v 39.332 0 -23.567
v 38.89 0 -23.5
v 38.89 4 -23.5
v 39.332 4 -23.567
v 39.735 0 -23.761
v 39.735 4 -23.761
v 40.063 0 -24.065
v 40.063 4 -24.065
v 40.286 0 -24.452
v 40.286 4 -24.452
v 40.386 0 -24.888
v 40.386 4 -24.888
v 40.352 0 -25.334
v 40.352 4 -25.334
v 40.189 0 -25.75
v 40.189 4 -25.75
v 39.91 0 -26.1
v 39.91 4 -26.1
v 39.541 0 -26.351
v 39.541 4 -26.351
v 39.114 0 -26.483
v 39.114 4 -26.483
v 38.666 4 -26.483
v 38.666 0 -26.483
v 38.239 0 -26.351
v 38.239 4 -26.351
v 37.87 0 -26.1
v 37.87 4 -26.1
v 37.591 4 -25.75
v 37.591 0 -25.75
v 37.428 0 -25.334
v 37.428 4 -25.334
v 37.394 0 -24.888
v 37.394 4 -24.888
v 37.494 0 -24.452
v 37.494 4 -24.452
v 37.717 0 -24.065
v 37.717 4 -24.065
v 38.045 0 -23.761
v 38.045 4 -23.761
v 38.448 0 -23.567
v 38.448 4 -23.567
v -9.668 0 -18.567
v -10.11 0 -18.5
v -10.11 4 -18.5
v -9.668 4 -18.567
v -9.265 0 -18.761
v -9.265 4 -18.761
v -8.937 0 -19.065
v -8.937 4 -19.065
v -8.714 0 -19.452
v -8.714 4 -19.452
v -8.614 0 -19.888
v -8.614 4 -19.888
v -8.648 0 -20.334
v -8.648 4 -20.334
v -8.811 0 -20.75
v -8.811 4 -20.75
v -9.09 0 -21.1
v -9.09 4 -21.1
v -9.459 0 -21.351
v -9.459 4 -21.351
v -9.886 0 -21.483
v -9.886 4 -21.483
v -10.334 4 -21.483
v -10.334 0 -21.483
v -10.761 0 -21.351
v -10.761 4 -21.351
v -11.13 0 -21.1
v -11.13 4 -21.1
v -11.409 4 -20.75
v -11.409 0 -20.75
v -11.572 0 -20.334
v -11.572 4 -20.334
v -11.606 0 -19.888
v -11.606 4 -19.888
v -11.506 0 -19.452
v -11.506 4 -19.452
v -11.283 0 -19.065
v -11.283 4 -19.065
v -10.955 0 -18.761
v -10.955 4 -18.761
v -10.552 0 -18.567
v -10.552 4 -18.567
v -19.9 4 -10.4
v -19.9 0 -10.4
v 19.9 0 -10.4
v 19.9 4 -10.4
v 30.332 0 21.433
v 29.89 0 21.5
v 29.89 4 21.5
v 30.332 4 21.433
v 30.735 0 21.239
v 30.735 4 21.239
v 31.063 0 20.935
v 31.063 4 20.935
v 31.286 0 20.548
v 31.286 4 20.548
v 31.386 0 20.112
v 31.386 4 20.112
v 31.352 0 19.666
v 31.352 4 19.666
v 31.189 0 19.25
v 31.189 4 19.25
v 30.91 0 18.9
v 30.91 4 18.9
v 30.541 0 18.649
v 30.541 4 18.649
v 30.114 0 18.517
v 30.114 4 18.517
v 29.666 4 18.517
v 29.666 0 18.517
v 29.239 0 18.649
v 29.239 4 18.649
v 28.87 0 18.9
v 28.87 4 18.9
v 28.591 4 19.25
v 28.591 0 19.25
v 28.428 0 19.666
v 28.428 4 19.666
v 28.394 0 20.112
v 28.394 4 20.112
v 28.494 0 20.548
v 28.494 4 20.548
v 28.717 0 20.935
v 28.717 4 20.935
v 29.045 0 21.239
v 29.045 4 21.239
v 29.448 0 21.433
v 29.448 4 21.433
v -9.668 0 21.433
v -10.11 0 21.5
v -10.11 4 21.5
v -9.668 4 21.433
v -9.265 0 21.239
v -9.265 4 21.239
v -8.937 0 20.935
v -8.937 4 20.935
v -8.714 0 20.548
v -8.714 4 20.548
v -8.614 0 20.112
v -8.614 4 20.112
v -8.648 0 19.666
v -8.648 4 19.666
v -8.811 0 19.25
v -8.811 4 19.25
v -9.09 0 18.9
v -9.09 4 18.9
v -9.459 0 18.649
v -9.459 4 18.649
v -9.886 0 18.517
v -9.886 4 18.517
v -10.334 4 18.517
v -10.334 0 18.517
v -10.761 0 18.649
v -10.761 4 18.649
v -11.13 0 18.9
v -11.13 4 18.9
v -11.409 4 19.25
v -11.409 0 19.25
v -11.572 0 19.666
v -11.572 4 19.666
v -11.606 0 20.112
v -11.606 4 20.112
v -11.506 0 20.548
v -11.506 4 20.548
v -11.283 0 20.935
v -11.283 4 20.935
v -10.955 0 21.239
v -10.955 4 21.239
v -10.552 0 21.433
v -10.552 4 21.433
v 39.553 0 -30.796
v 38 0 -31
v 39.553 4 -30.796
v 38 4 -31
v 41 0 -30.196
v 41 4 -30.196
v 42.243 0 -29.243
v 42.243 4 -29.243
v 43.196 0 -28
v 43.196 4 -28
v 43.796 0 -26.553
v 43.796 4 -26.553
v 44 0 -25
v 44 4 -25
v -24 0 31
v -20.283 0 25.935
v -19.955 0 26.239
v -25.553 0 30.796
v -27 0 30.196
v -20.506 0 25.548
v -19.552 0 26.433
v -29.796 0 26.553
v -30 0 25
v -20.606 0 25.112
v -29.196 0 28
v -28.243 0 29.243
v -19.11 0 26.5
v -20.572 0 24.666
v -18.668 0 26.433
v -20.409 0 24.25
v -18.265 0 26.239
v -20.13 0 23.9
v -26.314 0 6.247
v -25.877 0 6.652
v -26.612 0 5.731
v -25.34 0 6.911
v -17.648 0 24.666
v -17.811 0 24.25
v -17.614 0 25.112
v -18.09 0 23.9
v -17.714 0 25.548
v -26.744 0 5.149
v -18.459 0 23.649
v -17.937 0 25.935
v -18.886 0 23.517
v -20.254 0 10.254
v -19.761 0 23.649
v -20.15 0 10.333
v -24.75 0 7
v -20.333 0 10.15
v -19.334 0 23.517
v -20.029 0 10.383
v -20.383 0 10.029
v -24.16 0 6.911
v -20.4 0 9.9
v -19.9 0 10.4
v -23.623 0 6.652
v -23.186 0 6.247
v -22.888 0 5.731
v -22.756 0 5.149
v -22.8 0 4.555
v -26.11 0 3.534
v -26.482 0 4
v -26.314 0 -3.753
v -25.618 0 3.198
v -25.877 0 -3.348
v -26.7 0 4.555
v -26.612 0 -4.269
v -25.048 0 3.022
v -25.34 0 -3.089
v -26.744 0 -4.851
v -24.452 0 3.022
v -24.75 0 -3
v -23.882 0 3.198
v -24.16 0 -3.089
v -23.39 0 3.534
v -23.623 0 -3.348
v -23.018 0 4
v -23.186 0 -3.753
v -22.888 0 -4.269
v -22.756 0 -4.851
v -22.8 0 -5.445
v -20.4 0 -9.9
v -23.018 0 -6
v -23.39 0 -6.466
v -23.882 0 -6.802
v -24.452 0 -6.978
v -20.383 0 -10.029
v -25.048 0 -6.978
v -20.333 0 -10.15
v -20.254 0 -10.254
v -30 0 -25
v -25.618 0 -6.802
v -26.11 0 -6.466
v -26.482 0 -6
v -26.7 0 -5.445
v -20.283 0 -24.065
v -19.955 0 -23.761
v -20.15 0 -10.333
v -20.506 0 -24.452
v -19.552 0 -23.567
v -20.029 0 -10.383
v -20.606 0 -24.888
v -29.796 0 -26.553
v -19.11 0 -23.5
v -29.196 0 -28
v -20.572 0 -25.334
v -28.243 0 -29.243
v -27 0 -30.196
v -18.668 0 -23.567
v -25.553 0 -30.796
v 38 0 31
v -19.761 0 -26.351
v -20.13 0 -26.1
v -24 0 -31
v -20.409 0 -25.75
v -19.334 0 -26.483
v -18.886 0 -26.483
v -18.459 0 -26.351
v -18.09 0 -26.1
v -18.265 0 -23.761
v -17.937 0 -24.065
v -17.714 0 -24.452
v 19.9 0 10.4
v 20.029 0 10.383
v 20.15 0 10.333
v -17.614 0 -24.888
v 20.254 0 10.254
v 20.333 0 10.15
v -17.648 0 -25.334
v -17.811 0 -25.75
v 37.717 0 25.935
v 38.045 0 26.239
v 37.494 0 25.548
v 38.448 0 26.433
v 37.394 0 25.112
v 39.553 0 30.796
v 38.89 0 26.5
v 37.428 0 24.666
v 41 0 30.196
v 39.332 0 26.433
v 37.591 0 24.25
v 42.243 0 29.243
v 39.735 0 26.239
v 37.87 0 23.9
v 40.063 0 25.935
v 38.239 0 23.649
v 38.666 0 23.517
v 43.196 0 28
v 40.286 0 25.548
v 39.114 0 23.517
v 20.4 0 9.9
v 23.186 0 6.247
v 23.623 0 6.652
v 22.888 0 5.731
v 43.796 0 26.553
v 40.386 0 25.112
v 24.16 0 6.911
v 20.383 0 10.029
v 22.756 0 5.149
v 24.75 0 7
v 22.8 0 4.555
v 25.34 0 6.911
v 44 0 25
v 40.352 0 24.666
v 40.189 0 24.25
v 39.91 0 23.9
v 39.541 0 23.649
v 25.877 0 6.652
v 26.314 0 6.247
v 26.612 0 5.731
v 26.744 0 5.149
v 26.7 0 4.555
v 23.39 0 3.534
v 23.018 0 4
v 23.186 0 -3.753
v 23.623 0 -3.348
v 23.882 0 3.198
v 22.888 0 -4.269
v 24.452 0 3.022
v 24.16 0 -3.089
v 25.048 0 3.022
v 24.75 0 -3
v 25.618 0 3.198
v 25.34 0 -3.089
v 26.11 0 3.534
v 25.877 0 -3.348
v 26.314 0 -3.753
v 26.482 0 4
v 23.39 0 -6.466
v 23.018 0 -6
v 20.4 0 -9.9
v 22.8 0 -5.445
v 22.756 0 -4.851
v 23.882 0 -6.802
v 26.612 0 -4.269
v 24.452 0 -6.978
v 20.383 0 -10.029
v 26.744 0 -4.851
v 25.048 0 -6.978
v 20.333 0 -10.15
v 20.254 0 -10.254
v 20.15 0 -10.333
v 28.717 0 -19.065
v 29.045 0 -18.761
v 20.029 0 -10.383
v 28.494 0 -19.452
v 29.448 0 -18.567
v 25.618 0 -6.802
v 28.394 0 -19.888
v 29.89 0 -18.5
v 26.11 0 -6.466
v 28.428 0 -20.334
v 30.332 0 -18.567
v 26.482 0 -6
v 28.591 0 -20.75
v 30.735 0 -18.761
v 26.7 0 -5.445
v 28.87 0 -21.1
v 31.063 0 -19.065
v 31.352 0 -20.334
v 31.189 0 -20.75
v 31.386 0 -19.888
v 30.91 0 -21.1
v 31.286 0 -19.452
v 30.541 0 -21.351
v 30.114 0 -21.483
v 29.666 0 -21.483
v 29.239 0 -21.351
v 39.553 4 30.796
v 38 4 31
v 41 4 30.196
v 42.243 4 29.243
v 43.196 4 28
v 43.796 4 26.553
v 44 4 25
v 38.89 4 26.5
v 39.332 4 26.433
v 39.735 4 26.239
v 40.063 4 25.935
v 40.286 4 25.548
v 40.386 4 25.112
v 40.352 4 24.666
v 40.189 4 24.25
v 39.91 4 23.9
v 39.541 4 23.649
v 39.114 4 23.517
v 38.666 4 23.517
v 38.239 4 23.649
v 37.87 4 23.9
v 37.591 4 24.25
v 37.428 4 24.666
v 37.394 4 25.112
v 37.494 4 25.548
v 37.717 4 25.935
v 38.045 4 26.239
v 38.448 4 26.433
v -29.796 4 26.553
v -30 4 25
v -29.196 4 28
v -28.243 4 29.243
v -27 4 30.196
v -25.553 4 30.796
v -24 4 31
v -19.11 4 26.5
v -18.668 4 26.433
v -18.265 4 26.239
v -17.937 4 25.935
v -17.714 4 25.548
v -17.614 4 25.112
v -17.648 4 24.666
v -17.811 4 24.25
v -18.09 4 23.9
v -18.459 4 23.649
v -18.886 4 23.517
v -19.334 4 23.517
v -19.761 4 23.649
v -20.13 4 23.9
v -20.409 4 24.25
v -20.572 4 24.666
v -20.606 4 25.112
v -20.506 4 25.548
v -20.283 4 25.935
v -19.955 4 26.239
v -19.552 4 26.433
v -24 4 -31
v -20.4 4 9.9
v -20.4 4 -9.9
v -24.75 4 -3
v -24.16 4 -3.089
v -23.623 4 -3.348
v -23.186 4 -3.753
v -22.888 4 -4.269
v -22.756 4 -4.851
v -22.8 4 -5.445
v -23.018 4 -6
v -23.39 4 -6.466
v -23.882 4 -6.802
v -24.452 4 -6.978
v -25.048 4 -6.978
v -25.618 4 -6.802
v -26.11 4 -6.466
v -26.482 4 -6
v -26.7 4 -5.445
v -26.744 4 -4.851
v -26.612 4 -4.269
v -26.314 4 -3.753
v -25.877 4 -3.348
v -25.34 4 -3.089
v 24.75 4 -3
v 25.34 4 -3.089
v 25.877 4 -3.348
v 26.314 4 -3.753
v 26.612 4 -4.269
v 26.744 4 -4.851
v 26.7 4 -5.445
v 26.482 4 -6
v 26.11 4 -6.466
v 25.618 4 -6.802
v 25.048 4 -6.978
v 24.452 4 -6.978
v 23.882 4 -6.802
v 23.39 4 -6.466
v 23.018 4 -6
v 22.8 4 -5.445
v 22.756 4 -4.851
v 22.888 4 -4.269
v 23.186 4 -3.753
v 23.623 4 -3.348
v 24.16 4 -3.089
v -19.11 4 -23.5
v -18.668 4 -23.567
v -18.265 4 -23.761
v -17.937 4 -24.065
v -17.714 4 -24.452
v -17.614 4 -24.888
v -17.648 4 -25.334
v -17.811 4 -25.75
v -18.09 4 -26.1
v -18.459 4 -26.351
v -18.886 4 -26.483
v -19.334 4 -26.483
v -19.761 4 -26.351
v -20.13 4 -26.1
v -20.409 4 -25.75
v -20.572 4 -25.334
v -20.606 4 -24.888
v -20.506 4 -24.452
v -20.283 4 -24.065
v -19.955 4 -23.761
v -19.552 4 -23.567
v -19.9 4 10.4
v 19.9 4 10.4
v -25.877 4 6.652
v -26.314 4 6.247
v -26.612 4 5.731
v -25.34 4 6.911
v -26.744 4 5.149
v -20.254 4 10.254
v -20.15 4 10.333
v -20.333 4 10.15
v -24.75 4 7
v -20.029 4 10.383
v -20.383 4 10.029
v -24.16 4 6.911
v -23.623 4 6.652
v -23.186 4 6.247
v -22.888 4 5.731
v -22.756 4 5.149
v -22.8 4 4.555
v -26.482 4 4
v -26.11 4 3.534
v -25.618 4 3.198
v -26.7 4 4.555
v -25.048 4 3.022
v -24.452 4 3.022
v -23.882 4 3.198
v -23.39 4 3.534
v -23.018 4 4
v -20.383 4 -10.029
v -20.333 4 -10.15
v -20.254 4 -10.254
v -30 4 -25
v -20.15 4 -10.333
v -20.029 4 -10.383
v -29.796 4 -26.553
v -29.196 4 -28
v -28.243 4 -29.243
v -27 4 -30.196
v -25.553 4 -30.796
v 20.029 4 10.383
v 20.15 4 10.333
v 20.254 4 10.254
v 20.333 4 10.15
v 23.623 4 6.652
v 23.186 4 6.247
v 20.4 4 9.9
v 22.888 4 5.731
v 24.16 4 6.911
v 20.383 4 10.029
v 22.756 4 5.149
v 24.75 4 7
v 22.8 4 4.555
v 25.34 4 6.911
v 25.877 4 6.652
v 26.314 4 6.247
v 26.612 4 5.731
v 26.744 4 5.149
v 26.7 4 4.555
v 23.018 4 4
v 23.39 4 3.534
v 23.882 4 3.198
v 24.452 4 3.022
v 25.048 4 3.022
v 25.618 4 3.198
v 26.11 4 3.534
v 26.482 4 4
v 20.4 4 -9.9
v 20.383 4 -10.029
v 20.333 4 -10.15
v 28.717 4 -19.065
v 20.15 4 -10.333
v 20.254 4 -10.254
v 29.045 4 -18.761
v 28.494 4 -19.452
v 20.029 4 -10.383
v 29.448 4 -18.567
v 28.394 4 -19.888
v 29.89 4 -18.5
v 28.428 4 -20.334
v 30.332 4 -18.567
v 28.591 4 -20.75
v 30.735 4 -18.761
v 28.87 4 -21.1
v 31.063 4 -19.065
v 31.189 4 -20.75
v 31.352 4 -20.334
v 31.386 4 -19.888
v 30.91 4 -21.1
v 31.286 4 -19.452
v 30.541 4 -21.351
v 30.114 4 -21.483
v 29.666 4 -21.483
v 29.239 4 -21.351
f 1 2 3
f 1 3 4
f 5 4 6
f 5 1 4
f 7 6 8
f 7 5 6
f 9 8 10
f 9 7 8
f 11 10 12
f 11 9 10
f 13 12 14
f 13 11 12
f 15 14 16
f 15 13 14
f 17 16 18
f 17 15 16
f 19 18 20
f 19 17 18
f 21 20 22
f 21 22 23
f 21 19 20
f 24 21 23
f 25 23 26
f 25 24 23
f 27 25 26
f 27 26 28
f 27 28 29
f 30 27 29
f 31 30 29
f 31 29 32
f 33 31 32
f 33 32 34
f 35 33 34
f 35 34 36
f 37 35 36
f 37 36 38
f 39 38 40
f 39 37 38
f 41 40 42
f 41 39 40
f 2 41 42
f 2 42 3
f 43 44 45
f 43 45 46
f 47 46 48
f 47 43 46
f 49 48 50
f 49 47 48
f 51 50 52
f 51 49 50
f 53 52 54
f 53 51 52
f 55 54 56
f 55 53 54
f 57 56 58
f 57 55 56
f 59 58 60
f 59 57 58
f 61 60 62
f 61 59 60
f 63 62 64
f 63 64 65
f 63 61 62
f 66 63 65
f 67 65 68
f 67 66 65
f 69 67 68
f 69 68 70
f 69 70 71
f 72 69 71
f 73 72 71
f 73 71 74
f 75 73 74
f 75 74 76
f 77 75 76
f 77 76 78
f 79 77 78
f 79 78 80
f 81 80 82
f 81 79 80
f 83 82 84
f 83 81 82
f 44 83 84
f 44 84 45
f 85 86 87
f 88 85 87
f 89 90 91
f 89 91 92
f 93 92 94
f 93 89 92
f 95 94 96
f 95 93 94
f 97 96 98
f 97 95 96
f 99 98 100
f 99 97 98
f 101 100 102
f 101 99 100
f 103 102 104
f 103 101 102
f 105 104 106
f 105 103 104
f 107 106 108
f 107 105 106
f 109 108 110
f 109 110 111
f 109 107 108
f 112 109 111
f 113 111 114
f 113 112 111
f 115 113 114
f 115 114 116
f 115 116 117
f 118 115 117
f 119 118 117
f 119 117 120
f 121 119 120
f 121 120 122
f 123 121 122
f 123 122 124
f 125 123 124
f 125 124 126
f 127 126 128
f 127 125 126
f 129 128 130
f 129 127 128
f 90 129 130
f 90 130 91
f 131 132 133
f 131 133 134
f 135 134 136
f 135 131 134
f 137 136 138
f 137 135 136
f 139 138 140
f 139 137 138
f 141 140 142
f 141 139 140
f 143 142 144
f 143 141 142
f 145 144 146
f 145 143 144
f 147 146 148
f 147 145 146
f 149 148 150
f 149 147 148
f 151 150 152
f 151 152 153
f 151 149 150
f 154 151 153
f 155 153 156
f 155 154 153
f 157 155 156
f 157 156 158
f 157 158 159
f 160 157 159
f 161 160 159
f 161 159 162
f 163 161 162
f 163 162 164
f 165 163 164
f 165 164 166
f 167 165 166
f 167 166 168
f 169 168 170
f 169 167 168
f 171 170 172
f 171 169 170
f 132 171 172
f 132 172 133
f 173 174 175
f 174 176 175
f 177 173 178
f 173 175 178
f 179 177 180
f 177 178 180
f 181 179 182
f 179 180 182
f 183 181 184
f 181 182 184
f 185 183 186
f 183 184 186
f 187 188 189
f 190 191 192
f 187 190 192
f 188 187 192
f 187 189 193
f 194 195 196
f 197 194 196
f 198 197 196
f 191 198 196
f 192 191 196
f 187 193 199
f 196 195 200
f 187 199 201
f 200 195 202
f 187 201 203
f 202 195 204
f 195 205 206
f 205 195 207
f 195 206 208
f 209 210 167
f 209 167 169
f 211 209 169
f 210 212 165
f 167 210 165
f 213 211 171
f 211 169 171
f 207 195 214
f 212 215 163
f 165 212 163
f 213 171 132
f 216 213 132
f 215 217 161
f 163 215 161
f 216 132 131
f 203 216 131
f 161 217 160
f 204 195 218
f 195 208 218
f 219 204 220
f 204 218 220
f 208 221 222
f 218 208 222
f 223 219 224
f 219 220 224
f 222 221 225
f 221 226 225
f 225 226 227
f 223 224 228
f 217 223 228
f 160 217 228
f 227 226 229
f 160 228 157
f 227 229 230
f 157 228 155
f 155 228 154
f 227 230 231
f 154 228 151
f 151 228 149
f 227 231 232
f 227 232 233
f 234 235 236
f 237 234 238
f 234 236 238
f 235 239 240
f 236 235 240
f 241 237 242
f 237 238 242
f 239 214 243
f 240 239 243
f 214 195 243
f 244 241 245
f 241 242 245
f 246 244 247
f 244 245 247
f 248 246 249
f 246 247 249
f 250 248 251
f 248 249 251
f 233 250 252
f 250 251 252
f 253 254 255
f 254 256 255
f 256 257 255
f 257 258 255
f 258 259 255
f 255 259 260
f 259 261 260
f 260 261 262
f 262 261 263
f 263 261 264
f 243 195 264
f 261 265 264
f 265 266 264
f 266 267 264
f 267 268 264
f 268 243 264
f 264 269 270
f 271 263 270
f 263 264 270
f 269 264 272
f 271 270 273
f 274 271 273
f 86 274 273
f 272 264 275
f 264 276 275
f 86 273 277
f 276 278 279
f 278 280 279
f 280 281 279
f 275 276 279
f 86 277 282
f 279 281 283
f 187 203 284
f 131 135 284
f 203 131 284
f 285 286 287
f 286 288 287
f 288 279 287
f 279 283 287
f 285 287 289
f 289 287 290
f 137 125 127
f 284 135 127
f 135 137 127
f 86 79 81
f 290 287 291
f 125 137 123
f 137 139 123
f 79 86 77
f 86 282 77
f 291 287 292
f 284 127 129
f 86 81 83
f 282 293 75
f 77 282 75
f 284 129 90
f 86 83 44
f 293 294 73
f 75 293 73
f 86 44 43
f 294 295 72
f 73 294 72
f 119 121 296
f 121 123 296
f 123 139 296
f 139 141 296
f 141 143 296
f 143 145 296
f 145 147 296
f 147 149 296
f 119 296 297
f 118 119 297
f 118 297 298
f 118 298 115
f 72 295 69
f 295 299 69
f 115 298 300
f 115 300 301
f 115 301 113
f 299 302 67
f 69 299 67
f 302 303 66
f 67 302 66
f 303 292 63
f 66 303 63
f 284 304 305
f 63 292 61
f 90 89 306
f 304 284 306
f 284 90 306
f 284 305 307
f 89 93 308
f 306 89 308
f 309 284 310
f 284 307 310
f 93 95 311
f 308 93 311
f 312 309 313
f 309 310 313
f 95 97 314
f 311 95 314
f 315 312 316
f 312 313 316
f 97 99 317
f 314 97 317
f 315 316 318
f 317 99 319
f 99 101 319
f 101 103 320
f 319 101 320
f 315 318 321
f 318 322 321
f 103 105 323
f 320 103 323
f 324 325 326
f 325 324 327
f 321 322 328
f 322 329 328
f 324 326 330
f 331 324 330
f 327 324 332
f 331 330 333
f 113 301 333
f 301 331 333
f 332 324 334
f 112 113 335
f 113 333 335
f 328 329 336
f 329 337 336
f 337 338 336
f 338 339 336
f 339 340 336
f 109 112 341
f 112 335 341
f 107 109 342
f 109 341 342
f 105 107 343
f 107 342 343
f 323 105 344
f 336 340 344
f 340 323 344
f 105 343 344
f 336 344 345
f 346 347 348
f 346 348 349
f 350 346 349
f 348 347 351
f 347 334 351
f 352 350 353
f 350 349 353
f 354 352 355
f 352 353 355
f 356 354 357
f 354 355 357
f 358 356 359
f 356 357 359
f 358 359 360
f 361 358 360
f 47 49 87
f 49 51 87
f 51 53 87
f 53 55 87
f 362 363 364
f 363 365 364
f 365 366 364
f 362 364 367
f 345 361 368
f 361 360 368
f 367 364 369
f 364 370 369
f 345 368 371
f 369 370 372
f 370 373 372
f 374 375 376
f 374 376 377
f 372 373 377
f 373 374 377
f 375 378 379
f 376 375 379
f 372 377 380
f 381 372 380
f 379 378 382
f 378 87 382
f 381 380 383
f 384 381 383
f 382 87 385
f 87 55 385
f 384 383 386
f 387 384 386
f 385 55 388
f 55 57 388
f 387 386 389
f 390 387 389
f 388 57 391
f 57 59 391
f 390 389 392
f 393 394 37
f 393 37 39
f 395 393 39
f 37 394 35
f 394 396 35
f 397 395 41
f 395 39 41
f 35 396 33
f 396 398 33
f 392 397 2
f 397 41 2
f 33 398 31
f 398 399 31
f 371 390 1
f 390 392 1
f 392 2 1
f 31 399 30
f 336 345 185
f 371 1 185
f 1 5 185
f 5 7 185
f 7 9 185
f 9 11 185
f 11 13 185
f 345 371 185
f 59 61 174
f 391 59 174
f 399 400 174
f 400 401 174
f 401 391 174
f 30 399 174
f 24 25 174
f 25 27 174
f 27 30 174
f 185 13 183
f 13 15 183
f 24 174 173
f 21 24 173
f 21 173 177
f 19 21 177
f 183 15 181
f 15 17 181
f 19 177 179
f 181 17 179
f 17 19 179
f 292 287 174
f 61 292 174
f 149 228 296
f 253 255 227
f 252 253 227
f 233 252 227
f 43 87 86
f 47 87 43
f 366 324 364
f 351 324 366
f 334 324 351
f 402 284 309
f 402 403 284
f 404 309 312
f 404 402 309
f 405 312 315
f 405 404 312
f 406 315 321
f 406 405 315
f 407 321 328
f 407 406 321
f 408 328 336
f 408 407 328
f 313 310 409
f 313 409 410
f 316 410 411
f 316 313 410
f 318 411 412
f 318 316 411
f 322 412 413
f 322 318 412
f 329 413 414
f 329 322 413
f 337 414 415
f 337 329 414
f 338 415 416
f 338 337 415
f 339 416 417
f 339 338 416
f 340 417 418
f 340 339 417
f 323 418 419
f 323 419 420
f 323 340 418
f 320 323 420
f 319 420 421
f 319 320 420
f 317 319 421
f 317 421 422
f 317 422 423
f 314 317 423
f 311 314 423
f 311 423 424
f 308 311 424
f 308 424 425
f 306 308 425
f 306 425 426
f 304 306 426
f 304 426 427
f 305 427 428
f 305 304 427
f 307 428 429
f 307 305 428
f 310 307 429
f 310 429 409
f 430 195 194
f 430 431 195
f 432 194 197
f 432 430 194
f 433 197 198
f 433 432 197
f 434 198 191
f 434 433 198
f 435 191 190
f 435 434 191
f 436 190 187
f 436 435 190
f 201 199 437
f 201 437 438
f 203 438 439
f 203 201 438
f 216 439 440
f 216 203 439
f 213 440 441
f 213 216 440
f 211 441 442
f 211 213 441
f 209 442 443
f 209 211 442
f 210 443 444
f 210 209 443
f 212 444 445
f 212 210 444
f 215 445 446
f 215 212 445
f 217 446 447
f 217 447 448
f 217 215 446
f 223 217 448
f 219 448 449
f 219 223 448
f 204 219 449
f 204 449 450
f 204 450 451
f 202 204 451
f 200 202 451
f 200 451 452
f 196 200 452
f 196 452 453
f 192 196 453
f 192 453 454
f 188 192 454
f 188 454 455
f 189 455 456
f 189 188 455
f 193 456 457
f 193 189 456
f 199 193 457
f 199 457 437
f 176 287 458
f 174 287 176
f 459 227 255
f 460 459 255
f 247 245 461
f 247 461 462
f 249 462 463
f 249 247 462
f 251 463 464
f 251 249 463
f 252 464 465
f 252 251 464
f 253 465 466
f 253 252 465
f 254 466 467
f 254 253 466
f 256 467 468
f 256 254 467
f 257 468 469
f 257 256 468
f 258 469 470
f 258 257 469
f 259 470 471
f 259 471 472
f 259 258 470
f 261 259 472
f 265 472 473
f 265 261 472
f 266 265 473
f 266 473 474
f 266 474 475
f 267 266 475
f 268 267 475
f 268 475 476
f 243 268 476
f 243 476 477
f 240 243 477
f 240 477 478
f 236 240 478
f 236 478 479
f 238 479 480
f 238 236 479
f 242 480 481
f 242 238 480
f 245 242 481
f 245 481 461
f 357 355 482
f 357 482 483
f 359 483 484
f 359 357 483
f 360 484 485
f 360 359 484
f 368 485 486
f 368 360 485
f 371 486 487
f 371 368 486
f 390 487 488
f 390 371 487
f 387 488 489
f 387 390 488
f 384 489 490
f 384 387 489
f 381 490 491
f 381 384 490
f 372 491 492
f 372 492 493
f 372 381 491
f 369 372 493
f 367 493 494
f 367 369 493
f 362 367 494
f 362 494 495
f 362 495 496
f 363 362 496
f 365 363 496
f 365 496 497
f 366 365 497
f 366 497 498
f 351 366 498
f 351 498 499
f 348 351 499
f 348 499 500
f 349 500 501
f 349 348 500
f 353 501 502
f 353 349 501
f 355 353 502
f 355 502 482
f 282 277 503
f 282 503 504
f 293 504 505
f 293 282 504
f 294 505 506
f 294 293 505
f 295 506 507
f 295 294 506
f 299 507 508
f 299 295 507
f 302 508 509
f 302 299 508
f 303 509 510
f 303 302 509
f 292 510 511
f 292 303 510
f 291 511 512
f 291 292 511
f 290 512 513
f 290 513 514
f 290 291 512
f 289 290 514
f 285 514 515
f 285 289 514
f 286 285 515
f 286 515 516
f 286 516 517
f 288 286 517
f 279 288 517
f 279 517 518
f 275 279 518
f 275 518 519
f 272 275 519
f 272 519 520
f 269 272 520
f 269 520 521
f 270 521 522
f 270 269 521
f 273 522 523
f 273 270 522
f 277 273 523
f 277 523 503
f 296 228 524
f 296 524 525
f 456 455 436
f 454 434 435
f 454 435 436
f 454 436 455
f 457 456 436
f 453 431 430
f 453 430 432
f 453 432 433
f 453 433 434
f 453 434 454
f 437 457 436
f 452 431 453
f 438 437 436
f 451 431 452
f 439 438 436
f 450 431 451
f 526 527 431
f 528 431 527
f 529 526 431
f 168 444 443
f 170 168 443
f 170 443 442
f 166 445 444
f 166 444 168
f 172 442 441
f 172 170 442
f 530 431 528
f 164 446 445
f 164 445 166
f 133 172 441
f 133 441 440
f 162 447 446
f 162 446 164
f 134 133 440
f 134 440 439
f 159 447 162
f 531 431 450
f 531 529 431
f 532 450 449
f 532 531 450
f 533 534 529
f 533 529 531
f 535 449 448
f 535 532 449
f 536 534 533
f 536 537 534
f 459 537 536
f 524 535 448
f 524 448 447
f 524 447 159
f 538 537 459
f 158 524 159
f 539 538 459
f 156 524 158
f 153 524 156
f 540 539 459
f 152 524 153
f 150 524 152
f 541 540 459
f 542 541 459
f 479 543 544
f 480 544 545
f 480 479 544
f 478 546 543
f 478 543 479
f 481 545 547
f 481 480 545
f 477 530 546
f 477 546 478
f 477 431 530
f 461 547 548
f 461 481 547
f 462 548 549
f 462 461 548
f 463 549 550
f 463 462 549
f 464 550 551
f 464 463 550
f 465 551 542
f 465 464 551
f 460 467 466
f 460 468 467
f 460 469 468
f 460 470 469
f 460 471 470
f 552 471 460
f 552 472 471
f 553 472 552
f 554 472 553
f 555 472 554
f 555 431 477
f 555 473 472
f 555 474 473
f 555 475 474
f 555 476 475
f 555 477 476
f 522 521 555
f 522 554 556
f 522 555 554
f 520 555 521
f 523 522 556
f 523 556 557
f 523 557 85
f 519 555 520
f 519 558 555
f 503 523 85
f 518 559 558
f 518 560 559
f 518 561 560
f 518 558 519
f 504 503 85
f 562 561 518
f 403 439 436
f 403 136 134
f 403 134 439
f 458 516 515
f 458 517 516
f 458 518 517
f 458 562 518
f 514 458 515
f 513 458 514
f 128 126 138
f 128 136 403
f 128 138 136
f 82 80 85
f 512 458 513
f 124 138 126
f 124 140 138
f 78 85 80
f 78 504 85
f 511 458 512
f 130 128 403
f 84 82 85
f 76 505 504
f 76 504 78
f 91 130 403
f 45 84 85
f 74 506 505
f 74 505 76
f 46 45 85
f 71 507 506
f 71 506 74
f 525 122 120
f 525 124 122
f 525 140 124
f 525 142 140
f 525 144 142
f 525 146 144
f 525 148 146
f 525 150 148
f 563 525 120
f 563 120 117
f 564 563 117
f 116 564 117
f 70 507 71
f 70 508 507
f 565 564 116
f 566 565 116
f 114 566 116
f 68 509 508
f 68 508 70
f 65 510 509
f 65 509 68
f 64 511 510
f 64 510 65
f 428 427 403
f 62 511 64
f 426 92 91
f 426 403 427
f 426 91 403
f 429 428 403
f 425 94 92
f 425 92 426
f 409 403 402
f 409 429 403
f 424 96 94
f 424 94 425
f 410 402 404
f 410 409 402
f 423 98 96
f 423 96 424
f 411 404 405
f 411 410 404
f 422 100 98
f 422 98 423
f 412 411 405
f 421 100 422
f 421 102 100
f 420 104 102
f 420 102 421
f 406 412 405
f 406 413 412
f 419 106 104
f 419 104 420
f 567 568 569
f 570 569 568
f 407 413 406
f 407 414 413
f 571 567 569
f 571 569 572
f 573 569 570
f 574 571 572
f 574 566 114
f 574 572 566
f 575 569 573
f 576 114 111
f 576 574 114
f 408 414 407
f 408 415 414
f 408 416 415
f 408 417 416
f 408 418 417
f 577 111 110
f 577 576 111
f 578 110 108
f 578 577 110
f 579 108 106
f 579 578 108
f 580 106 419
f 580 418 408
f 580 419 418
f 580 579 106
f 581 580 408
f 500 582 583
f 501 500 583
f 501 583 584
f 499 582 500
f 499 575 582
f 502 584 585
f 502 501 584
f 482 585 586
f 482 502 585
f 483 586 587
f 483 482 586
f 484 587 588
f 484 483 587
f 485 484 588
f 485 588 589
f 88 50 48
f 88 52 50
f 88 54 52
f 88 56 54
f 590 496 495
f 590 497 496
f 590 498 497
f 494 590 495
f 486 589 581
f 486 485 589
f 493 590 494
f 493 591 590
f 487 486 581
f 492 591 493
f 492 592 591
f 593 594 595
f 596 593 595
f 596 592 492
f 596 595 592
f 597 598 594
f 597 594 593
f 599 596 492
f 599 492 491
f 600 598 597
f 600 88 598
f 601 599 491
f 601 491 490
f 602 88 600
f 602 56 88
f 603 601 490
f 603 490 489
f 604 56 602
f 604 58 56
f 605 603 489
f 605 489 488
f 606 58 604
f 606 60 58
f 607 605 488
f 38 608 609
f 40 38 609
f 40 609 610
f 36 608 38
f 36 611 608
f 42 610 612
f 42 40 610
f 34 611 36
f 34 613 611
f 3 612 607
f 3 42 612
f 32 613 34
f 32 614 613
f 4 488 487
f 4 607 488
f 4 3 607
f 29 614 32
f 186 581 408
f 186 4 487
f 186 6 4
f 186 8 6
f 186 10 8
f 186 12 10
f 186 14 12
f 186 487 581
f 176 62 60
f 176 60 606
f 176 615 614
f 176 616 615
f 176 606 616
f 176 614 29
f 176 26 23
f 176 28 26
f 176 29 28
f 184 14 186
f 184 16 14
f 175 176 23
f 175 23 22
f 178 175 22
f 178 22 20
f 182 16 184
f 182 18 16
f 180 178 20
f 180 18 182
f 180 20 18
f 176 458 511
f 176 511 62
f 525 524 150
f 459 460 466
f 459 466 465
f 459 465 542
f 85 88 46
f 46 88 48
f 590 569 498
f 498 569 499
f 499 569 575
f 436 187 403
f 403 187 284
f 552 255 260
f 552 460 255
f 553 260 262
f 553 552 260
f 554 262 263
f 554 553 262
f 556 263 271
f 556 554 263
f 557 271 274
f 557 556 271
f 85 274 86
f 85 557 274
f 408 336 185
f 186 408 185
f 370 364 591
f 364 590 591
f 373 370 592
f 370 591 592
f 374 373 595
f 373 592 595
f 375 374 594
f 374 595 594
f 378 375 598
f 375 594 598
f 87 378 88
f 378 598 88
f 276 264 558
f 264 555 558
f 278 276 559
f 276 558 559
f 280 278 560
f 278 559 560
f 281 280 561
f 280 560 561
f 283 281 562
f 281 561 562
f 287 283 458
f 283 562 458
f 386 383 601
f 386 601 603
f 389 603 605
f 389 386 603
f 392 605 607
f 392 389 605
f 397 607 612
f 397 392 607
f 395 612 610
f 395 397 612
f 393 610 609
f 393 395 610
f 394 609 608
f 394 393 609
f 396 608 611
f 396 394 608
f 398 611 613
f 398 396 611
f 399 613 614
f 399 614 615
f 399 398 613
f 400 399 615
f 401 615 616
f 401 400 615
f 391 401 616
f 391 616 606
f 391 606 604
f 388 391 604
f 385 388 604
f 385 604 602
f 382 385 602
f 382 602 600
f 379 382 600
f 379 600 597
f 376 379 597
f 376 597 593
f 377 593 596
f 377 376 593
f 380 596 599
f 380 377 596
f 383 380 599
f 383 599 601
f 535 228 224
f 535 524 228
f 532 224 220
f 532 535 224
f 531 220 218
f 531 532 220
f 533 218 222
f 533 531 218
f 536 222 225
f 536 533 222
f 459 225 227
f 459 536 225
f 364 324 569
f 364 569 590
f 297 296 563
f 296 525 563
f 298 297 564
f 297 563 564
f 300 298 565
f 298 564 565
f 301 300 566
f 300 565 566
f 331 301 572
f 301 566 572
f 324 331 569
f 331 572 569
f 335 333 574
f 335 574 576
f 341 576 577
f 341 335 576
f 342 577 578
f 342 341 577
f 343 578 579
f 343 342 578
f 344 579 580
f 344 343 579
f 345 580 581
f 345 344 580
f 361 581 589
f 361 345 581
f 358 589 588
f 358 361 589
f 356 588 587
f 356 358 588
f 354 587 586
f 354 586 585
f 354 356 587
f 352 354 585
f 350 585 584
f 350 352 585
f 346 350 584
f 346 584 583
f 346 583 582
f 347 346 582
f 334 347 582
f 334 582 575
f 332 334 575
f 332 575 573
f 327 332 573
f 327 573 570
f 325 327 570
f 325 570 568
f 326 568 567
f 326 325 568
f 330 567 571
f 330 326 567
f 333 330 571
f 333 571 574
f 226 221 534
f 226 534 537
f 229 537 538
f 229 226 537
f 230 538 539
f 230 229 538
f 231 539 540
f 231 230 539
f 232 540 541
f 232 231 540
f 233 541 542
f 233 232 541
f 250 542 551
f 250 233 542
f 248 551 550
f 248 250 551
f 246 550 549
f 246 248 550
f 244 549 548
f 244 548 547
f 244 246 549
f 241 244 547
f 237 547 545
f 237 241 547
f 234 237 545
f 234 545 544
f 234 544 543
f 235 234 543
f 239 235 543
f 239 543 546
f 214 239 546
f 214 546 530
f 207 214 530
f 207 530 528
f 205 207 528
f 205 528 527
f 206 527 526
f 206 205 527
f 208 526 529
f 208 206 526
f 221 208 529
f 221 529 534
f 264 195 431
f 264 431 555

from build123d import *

# Parameters (mm, degrees)
SKETCH_1_W      = 74
SKETCH_1_H      = 62
SKETCH_1_R      = 1.5
SKETCH_1_R_2    = 2
SKETCH_1_W_2    = 40.8
SKETCH_1_H_2    = 20.8
EXTRUDE_1_DEPTH = 4
FILLET_1_R      = 0.5
FILLET_2_R      = 6


with BuildPart() as part:
    # 草图1 → 凸台-拉伸1 (new body)
    with BuildSketch(Plane(origin=(0, 0, 0), x_dir=(1, 0, 0), z_dir=(0, 1, 0))):
        with Locations((7, 0)):
            Rectangle(SKETCH_1_W, SKETCH_1_H)
        with Locations(Location((29.89, 20, 0), (0, 0, 270))):
            Circle(SKETCH_1_R, mode=Mode.SUBTRACT)
        with Locations(Location((29.89, -20, 0), (0, 0, 270))):
            Circle(SKETCH_1_R, mode=Mode.SUBTRACT)
        with Locations(Location((-19.11, -25, 0), (0, 0, 270))):
            Circle(SKETCH_1_R, mode=Mode.SUBTRACT)
        with Locations(Location((-10.11, -20, 0), (0, 0, 270))):
            Circle(SKETCH_1_R, mode=Mode.SUBTRACT)
        with Locations(Location((-24.75, -5, 0), (0, 0, 270))):
            Circle(SKETCH_1_R_2, mode=Mode.SUBTRACT)
        with Locations(Location((24.75, -5, 0), (0, 0, 270))):
            Circle(SKETCH_1_R_2, mode=Mode.SUBTRACT)
        with Locations(Location((-24.75, 5, 0), (0, 0, 270))):
            Circle(SKETCH_1_R_2, mode=Mode.SUBTRACT)
        Rectangle(SKETCH_1_W_2, SKETCH_1_H_2, mode=Mode.SUBTRACT)
        with Locations(Location((-19.11, 25, 0), (0, 0, 270))):
            Circle(SKETCH_1_R, mode=Mode.SUBTRACT)
        with Locations(Location((-10.11, 20, 0), (0, 0, 270))):
            Circle(SKETCH_1_R, mode=Mode.SUBTRACT)
        with Locations(Location((24.75, 5, 0), (0, 0, 270))):
            Circle(SKETCH_1_R_2, mode=Mode.SUBTRACT)
        with Locations(Location((38.89, -25, 0), (0, 0, 270))):
            Circle(SKETCH_1_R, mode=Mode.SUBTRACT)
        with Locations(Location((38.89, 25, 0), (0, 0, 270))):
            Circle(SKETCH_1_R, mode=Mode.SUBTRACT)
    extrude(amount=EXTRUDE_1_DEPTH)

    # 圆角1
    fillet_1_edges = [part.edges().sort_by_distance(p)[0] for p in [
        (20.4, 2, -10.4),
        (-20.4, 2, -10.4),
        (-20.4, 2, 10.4),
        (20.4, 2, 10.4),
    ]]
    fillet(fillet_1_edges, radius=FILLET_1_R)

    # 圆角2
    fillet_2_edges = [part.edges().sort_by_distance(p)[0] for p in [
        (44, 2, 31),
        (-30, 2, 31),
        (-30, 2, -31),
        (44, 2, -31),
    ]]
    fillet(fillet_2_edges, radius=FILLET_2_R)


solid = part.part
